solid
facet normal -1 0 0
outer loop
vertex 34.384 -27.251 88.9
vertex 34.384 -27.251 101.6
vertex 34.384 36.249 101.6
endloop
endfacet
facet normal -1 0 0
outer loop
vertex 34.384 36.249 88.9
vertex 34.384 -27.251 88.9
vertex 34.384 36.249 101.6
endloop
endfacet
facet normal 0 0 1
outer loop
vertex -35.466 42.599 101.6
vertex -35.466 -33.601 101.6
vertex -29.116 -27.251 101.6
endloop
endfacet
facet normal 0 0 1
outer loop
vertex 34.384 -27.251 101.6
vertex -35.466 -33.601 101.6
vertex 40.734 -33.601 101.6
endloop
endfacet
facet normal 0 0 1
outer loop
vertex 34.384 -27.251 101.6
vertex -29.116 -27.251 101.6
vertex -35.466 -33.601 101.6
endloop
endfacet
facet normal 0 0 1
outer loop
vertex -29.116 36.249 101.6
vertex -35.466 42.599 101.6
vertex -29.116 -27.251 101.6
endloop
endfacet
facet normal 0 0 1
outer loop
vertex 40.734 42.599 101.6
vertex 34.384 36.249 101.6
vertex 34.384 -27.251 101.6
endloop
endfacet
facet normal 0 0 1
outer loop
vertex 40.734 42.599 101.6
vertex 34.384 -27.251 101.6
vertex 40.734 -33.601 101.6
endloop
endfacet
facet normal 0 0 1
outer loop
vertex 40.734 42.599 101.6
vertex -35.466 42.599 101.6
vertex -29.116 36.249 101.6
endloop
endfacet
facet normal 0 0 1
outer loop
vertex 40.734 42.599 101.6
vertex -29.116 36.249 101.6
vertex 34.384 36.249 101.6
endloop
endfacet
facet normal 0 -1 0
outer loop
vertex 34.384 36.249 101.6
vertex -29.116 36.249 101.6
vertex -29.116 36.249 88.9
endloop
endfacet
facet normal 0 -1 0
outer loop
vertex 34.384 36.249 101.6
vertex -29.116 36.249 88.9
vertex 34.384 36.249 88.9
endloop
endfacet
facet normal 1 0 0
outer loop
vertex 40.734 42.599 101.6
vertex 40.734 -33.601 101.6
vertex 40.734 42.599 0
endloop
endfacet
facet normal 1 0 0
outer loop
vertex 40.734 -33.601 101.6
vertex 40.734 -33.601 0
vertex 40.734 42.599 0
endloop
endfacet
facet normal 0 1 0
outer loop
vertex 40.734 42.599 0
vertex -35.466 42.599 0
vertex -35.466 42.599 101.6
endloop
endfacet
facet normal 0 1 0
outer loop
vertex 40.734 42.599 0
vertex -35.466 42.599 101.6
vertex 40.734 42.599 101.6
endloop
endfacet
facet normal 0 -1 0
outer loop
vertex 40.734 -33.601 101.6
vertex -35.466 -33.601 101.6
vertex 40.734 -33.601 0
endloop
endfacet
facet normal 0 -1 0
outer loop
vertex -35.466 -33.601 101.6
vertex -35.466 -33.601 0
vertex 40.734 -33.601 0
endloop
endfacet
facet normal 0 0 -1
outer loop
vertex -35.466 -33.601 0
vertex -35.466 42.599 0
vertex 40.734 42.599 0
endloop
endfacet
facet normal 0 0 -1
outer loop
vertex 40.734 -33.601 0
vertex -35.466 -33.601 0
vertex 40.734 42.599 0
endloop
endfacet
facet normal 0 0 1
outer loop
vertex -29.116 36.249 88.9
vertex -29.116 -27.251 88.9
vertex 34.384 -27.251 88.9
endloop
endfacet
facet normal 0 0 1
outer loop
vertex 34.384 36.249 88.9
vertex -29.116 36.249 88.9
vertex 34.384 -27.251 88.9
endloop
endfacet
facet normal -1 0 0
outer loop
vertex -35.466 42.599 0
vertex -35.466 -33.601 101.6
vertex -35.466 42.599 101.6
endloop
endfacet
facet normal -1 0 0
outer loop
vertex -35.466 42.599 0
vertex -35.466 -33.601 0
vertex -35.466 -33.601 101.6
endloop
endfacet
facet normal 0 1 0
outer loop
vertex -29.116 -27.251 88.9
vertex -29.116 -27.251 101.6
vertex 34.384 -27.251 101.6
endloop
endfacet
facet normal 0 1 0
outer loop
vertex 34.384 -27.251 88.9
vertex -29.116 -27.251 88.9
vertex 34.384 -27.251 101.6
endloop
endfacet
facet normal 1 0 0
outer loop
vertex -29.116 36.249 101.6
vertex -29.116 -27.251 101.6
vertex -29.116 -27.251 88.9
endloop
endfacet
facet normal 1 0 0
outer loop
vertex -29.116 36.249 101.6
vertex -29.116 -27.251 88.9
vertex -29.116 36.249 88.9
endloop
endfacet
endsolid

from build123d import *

# Parameters (mm, degrees)
F0_W     = 76.2
F0_H     = 76.2
F1_DEPTH = 76.2
F2_DEPTH = 25.4
F3_W     = 63.5
F3_H     = 63.5000005424
F4_DEPTH = 12.7


with BuildPart() as f1:
    # F0 (on Top) → F1 (new body)
    with BuildSketch(Plane.XY):
        with Locations((2.6339268429, 4.4994018972)):
            Rectangle(F0_W, F0_H)
    extrude(amount=F1_DEPTH)

    # F2 (add): a face of the model
    f2_faces = [f1.faces().sort_by_distance(p)[0] for p in [
        (2.6339268429, 4.4994018972, 76.2),
    ]]
    extrude(f2_faces, amount=F2_DEPTH)

    # F3 (on face) → F4 (cut)
    with BuildSketch(Plane.XY.offset(101.6)):
        with Locations((2.6339268429, 4.4994021684)):
            Rectangle(F3_W, F3_H)
    extrude(amount=-F4_DEPTH, mode=Mode.SUBTRACT)


solid = f1.part
